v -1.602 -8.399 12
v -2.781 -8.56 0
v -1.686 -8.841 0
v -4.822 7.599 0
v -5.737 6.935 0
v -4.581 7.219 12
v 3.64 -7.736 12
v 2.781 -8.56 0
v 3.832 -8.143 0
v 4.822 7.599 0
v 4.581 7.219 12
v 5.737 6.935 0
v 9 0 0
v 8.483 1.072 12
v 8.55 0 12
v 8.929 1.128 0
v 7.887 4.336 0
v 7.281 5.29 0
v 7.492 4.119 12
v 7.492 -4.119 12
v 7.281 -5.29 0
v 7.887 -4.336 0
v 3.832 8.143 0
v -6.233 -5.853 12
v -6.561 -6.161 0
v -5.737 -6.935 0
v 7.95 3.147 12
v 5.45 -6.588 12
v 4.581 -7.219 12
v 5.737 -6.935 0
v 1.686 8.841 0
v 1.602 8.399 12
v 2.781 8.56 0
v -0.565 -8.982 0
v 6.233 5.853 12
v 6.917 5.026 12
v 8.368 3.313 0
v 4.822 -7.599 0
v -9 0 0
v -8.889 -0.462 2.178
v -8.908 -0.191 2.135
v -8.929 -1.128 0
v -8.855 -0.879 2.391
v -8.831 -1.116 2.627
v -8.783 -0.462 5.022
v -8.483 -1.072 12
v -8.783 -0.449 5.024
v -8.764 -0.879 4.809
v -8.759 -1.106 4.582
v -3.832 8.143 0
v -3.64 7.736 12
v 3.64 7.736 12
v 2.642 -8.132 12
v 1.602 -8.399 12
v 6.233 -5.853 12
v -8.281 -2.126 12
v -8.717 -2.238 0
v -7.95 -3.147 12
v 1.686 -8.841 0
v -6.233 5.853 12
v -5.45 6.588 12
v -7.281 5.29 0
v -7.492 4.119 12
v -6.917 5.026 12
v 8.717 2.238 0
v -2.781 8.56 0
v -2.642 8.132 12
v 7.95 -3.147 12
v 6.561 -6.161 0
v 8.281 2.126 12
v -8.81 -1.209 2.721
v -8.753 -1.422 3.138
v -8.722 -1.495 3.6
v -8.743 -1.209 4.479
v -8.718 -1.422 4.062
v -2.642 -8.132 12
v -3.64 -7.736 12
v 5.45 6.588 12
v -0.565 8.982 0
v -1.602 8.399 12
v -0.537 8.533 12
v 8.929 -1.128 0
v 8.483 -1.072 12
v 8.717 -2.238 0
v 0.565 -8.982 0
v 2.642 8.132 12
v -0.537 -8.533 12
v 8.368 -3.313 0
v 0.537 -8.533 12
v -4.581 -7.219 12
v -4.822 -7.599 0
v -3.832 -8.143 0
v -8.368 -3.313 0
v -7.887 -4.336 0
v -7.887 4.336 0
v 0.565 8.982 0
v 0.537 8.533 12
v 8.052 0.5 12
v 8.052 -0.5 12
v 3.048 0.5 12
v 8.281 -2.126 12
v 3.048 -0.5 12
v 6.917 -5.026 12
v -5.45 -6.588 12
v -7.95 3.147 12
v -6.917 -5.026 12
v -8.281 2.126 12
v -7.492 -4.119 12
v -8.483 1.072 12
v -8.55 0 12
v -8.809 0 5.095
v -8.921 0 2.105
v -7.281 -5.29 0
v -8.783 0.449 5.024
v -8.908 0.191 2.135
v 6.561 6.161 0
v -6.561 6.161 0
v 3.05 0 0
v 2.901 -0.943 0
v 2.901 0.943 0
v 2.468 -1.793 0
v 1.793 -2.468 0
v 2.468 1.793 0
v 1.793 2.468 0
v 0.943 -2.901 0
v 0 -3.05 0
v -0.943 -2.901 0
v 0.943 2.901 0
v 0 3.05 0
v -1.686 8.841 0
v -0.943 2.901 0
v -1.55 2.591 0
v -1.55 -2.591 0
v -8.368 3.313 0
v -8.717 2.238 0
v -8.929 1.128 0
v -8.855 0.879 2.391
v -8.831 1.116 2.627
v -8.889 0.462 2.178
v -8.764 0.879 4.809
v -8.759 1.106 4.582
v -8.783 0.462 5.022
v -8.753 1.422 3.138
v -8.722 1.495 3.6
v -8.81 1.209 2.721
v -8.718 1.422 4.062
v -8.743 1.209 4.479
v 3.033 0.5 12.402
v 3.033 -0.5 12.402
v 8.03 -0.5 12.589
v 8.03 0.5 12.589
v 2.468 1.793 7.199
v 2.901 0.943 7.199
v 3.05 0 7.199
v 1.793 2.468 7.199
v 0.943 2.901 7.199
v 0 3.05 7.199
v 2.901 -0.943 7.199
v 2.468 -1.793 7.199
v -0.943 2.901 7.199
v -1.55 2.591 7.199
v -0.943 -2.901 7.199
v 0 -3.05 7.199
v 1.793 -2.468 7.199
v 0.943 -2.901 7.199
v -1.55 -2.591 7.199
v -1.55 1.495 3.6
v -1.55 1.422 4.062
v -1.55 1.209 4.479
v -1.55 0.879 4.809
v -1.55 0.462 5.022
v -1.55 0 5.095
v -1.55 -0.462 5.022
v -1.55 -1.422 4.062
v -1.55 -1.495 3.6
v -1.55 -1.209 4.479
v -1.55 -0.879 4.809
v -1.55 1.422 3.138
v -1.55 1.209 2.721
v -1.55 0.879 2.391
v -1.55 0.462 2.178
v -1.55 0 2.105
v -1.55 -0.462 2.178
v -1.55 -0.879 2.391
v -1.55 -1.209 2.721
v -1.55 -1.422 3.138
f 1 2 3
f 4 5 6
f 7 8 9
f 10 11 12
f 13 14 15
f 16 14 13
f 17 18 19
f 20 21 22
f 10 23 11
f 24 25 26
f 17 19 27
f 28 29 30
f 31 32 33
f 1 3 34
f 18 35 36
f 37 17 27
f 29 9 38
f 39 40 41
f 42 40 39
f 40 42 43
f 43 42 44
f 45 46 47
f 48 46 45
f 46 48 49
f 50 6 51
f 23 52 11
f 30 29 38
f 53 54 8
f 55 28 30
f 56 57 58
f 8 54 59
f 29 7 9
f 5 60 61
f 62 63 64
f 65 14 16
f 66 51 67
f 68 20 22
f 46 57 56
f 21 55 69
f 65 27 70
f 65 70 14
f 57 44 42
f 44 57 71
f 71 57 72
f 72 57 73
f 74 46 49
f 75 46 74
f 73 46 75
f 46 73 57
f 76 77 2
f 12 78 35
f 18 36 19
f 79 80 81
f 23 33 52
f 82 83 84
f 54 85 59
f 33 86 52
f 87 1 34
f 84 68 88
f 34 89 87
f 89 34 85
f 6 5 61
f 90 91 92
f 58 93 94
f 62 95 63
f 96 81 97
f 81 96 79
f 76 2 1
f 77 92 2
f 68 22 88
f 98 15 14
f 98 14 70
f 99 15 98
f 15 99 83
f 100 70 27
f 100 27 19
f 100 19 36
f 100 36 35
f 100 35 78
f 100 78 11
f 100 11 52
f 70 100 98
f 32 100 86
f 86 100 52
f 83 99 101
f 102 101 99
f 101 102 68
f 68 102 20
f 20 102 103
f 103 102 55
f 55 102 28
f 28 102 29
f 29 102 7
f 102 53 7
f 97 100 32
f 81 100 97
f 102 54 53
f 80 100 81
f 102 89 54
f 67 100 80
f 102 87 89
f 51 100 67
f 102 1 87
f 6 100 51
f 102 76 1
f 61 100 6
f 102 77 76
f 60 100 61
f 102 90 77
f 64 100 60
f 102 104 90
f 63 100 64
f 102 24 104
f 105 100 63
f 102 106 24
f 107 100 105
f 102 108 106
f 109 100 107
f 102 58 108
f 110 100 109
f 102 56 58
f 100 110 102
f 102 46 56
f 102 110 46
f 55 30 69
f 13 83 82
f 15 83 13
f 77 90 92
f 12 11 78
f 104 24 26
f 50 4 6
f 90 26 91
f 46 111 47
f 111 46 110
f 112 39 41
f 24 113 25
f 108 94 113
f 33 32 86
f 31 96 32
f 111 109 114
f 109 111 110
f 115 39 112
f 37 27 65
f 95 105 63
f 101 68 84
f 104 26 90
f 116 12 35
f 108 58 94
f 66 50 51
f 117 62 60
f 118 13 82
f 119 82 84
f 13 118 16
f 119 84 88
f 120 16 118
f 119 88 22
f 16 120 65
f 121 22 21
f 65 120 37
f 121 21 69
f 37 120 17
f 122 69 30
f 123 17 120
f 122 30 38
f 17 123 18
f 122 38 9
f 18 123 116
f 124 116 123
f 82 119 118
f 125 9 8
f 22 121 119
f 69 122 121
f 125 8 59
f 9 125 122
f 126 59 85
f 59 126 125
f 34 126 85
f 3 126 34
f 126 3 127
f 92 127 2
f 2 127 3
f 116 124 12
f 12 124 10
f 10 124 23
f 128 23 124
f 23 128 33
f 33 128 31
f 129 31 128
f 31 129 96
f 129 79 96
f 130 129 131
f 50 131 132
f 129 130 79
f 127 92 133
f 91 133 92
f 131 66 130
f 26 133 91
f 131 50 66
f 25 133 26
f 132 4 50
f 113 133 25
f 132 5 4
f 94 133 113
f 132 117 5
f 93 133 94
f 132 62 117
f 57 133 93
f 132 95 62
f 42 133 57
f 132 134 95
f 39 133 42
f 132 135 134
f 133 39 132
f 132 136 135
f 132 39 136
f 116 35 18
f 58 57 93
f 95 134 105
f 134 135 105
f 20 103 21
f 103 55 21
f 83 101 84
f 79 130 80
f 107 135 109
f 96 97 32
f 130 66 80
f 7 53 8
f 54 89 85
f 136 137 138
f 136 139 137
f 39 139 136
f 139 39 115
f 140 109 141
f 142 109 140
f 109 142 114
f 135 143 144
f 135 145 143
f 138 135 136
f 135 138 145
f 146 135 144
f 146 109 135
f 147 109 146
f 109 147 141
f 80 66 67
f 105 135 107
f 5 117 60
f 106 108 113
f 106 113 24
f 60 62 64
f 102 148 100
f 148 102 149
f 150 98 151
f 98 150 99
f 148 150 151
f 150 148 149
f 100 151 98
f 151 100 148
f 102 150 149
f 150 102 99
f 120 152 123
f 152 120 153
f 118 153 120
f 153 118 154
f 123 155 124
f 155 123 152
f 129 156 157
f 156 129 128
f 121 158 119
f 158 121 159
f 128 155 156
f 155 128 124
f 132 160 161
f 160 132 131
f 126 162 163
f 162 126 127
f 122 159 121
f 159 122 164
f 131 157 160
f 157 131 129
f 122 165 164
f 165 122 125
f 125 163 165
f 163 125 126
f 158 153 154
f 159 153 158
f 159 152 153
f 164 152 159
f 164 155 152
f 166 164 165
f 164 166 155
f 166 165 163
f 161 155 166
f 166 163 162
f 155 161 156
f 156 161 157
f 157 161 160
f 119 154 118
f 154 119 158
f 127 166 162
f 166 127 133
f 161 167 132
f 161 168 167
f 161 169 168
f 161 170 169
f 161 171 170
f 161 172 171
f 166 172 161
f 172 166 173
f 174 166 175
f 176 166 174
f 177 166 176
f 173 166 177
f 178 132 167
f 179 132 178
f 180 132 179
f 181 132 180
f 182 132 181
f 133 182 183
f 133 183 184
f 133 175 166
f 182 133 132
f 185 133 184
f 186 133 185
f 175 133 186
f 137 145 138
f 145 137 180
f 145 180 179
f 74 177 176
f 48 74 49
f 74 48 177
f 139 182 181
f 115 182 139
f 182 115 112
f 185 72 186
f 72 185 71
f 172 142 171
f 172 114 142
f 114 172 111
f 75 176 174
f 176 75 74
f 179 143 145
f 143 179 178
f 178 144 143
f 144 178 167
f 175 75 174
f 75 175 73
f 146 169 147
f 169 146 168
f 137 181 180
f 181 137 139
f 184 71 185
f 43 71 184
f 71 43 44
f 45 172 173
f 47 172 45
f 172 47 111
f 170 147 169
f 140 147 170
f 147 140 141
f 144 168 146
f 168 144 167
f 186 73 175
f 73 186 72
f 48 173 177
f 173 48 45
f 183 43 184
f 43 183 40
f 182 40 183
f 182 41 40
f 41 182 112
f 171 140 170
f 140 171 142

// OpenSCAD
//////////////////////////
// Customizable settings
//////////////////////////


// Diameter of the hole on the bottom (in mm).
HoleDiameter = 6.1;

// Depth of the hole in the bottom (in mm).  If you want the hole to go all the way through then set this to a number larger than the total height of the object.
HoleDepth = 7.2;

// If you want a D-shaped hole, set this to the thickness of the flat side (in mm).  Larger values for the flat make the hole smaller.
HoleFlatThickness = 1.5;

// Height (in mm).  If dome cap is selected, it is not included in height.  The shaft length is also not counted.
KnobHeight = 12;

// Diameter of base of round part of knob (in mm).  (Knurled ridges are not included in this measurement.)
KnobDiameter = 18;

// Shape of top of knob.  "Recessed" type can be painted.
CapType = 0;	// [0:Flat, 1:Recessed, 2:Dome]

// Do you want a large timer-knob style pointer?
TimerKnob=0;	// [0:No, 1:Yes]

// Would you like a divot on the top to indicate direction?
Pointer1 = 0;	// [0:No, 1:Yes]

// Would you like a line (pointer) on the front to indicate direction?
Pointer2 = 1;	// [0:No, 1:Yes]

// Do you want finger ridges around the knob?
Knurled = 0;	// [0:No, 1:Yes]

// 0 = A cylindrical knob, any other value will taper the knob.
TaperPercentage = 5;		// [0:0%, 10:10%, 20:20%, 30:30%, 40:40%, 50:50%]

// Width of "dial" ring (in mm).  Set to zero if you don't want the ring.
RingWidth = 0;

// The number of markings on the dial.  Set to zero if you don't want markings.  (RingWidth must be non-zero.)
RingMarkings = 10;

// diameter of the hole for the setscrew (in mm).  If you don't need a hole, set this to zero.
ScrewHoleDiameter = 2.99;

// Length of the shaft on the bottom of the knob (in mm).  If you don't want a shaft, set this value to zero.
ShaftLength = 0;

// Diameter of the shaft on the bottom of the knob (in mm).  (ShaftLength must be non-zero.)
ShaftDiameter = 10;

// Would you like a notch in the shaft?  It can be used for a press-on type knob (rather than using a setscrew).  (ShaftLength must be non-zero.)
NotchedShaft = 0;	// [0:No, 1:Yes]



//////////////////////////
//Advanced settings
//////////////////////////

RingThickness = 5*1;
DivotDepth = 1.5*1;
MarkingWidth = 1.5*1;
DistanceBetweenKnurls = 3*1;
TimerKnobConst = 1.8*1;



//////////////////////////
//Calculations
//////////////////////////

PI=3.14159265*1;
KnobMajorRadius = KnobDiameter/2;
KnobMinorRadius = KnobDiameter/2 * (1 - TaperPercentage/100);
KnobRadius = KnobMinorRadius + (KnobMajorRadius-KnobMinorRadius)/2;
KnobCircumference = PI*KnobDiameter;
Knurls = round(KnobCircumference/DistanceBetweenKnurls);
Divot=CapType;

TaperAngle=asin(KnobHeight / (sqrt(pow(KnobHeight, 2) +
		pow(KnobMajorRadius-KnobMinorRadius,2)))) - 90;

DivotRadius = KnobMinorRadius*.4;


union()
{
translate([0, 0, (ShaftLength==0)? 0 : ShaftLength-0.001])
difference()
{
union()
{
	// Primary knob cylinder
	cylinder(h=KnobHeight, r1=KnobMajorRadius, r2=KnobMinorRadius,
			$fn=50);
	
	if (Knurled)
		for (i=[0 : Knurls-1])
			rotate([0, 0, i * (360/Knurls)])
				translate([KnobRadius, 0, KnobHeight/2])
					rotate([0, TaperAngle, 0]) rotate([0, 0, 45])
						cube([2, 2, KnobHeight+.001], center=true);

 	if (RingMarkings>0)
		for (i=[0 : RingMarkings-1])
			rotate([0, 0, i * (360/RingMarkings)])
				translate([KnobMajorRadius + RingWidth/2, 0, 1])
					cube([RingWidth*.5, MarkingWidth, 2], center=true);		
	
	if (Pointer2==1)
		translate([KnobRadius-3, 0, KnobHeight/2])
			rotate([0, TaperAngle, 0])
				cube([5, 1, KnobHeight+1], center=true);		

	if (RingWidth>0)
		translate([0, 0, RingThickness/2])
			cylinder(r1=KnobMajorRadius + RingWidth, r2=KnobMinorRadius,
					h=RingThickness, $fn=50, center=true);

	if (Divot==2)
		translate([0, 0, KnobHeight])
			difference()
			{
				scale([1, 1, 0.5])
					sphere(r=KnobMinorRadius, $fn=50, center=true);

				translate([0, 0, 0-(KnobMinorRadius+.001)])
					cube([KnobMinorRadius*2.5, KnobMinorRadius*2.5,
							KnobMinorRadius*2], center=true);
			}

	if (TimerKnob==1) intersection()
		{
			translate([0, 0, 0-(KnobDiameter*TimerKnobConst) + KnobHeight])
			sphere(r=KnobDiameter*TimerKnobConst, $fn=50, center=true);		
	
			translate([0-(KnobDiameter*TimerKnobConst)*0.1, 0,
					KnobHeight/2])
				scale([1, 0.5, 1])
					cylinder(h=KnobHeight, r=(KnobDiameter*TimerKnobConst) *
							0.8, $fn=3, center=true);
		}
}

// Pointer1: Offset hemispherical divot
if (Pointer1==1)
	translate([KnobMinorRadius*.55, 0, KnobHeight + DivotRadius*.6])
		sphere(r=DivotRadius, $fn=40);

// Divot1: Centered cylynrical divot
if (Divot==1)
	translate([0, 0, KnobHeight])
		cylinder(h=DivotDepth*2, r=KnobMinorRadius-1.5, $fn=50,
				center=true);

if (ShaftLength==0)
{
	// Hole for shaft
	translate([0, 0, HoleDepth/2 - 0.001])
		difference()
		{
			cylinder(r=HoleDiameter/2, h=HoleDepth, $fn=20,
					center=true);
	
			// Flat for D-shaped hole
			translate([(0-HoleDiameter)+HoleFlatThickness, 0, 0])
				cube([HoleDiameter, HoleDiameter, HoleDepth+.001],
						center=true);
		}
	
	// Hole for setscrew
	if (ScrewHoleDiameter>0)
		translate([0 - (KnobMajorRadius+RingWidth+1)/2, 0,
				HoleDepth/2])
			rotate([0, 90, 0])
			cylinder(h=(KnobMajorRadius+RingWidth+1),
					r=ScrewHoleDiameter/2, $fn=20, center=true);
}

// Make sure bottom ends at z=0
translate([0, 0, -10])
	cube([(KnobMajorRadius+RingWidth) * 3,
			(KnobMajorRadius+RingWidth) * 3, 20], center=true);
}

if (ShaftLength>0)
	difference()
	{
		translate([0, 0, ShaftLength/2])
			cylinder(h=ShaftLength, r=ShaftDiameter/2, $fn=20,
					center=true);

		if (NotchedShaft==1)
		{
			cube([HoleDiameter/2, ShaftDiameter*2, ShaftLength],
					center=true);
		}

		// Hole for shaft
		translate([0, 0, HoleDepth/2 - 0.001])
			difference()
			{
				cylinder(r=HoleDiameter/2, h=HoleDepth, $fn=20,
						center=true);
		
				// Flat for D-shaped hole
				translate([(0-HoleDiameter)+HoleFlatThickness, 0, 0])
					cube([HoleDiameter, HoleDiameter, HoleDepth+.001],
							center=true);
			}
		
		// Hole for setscrew
		if (ScrewHoleDiameter>0)
			translate([0 - (KnobMajorRadius+RingWidth+1)/2, 0,
					HoleDepth/2])
				rotate([0, 90, 0])
				cylinder(h=(KnobMajorRadius+RingWidth+1),
						r=ScrewHoleDiameter/2, $fn=20, center=true);
	}
}
